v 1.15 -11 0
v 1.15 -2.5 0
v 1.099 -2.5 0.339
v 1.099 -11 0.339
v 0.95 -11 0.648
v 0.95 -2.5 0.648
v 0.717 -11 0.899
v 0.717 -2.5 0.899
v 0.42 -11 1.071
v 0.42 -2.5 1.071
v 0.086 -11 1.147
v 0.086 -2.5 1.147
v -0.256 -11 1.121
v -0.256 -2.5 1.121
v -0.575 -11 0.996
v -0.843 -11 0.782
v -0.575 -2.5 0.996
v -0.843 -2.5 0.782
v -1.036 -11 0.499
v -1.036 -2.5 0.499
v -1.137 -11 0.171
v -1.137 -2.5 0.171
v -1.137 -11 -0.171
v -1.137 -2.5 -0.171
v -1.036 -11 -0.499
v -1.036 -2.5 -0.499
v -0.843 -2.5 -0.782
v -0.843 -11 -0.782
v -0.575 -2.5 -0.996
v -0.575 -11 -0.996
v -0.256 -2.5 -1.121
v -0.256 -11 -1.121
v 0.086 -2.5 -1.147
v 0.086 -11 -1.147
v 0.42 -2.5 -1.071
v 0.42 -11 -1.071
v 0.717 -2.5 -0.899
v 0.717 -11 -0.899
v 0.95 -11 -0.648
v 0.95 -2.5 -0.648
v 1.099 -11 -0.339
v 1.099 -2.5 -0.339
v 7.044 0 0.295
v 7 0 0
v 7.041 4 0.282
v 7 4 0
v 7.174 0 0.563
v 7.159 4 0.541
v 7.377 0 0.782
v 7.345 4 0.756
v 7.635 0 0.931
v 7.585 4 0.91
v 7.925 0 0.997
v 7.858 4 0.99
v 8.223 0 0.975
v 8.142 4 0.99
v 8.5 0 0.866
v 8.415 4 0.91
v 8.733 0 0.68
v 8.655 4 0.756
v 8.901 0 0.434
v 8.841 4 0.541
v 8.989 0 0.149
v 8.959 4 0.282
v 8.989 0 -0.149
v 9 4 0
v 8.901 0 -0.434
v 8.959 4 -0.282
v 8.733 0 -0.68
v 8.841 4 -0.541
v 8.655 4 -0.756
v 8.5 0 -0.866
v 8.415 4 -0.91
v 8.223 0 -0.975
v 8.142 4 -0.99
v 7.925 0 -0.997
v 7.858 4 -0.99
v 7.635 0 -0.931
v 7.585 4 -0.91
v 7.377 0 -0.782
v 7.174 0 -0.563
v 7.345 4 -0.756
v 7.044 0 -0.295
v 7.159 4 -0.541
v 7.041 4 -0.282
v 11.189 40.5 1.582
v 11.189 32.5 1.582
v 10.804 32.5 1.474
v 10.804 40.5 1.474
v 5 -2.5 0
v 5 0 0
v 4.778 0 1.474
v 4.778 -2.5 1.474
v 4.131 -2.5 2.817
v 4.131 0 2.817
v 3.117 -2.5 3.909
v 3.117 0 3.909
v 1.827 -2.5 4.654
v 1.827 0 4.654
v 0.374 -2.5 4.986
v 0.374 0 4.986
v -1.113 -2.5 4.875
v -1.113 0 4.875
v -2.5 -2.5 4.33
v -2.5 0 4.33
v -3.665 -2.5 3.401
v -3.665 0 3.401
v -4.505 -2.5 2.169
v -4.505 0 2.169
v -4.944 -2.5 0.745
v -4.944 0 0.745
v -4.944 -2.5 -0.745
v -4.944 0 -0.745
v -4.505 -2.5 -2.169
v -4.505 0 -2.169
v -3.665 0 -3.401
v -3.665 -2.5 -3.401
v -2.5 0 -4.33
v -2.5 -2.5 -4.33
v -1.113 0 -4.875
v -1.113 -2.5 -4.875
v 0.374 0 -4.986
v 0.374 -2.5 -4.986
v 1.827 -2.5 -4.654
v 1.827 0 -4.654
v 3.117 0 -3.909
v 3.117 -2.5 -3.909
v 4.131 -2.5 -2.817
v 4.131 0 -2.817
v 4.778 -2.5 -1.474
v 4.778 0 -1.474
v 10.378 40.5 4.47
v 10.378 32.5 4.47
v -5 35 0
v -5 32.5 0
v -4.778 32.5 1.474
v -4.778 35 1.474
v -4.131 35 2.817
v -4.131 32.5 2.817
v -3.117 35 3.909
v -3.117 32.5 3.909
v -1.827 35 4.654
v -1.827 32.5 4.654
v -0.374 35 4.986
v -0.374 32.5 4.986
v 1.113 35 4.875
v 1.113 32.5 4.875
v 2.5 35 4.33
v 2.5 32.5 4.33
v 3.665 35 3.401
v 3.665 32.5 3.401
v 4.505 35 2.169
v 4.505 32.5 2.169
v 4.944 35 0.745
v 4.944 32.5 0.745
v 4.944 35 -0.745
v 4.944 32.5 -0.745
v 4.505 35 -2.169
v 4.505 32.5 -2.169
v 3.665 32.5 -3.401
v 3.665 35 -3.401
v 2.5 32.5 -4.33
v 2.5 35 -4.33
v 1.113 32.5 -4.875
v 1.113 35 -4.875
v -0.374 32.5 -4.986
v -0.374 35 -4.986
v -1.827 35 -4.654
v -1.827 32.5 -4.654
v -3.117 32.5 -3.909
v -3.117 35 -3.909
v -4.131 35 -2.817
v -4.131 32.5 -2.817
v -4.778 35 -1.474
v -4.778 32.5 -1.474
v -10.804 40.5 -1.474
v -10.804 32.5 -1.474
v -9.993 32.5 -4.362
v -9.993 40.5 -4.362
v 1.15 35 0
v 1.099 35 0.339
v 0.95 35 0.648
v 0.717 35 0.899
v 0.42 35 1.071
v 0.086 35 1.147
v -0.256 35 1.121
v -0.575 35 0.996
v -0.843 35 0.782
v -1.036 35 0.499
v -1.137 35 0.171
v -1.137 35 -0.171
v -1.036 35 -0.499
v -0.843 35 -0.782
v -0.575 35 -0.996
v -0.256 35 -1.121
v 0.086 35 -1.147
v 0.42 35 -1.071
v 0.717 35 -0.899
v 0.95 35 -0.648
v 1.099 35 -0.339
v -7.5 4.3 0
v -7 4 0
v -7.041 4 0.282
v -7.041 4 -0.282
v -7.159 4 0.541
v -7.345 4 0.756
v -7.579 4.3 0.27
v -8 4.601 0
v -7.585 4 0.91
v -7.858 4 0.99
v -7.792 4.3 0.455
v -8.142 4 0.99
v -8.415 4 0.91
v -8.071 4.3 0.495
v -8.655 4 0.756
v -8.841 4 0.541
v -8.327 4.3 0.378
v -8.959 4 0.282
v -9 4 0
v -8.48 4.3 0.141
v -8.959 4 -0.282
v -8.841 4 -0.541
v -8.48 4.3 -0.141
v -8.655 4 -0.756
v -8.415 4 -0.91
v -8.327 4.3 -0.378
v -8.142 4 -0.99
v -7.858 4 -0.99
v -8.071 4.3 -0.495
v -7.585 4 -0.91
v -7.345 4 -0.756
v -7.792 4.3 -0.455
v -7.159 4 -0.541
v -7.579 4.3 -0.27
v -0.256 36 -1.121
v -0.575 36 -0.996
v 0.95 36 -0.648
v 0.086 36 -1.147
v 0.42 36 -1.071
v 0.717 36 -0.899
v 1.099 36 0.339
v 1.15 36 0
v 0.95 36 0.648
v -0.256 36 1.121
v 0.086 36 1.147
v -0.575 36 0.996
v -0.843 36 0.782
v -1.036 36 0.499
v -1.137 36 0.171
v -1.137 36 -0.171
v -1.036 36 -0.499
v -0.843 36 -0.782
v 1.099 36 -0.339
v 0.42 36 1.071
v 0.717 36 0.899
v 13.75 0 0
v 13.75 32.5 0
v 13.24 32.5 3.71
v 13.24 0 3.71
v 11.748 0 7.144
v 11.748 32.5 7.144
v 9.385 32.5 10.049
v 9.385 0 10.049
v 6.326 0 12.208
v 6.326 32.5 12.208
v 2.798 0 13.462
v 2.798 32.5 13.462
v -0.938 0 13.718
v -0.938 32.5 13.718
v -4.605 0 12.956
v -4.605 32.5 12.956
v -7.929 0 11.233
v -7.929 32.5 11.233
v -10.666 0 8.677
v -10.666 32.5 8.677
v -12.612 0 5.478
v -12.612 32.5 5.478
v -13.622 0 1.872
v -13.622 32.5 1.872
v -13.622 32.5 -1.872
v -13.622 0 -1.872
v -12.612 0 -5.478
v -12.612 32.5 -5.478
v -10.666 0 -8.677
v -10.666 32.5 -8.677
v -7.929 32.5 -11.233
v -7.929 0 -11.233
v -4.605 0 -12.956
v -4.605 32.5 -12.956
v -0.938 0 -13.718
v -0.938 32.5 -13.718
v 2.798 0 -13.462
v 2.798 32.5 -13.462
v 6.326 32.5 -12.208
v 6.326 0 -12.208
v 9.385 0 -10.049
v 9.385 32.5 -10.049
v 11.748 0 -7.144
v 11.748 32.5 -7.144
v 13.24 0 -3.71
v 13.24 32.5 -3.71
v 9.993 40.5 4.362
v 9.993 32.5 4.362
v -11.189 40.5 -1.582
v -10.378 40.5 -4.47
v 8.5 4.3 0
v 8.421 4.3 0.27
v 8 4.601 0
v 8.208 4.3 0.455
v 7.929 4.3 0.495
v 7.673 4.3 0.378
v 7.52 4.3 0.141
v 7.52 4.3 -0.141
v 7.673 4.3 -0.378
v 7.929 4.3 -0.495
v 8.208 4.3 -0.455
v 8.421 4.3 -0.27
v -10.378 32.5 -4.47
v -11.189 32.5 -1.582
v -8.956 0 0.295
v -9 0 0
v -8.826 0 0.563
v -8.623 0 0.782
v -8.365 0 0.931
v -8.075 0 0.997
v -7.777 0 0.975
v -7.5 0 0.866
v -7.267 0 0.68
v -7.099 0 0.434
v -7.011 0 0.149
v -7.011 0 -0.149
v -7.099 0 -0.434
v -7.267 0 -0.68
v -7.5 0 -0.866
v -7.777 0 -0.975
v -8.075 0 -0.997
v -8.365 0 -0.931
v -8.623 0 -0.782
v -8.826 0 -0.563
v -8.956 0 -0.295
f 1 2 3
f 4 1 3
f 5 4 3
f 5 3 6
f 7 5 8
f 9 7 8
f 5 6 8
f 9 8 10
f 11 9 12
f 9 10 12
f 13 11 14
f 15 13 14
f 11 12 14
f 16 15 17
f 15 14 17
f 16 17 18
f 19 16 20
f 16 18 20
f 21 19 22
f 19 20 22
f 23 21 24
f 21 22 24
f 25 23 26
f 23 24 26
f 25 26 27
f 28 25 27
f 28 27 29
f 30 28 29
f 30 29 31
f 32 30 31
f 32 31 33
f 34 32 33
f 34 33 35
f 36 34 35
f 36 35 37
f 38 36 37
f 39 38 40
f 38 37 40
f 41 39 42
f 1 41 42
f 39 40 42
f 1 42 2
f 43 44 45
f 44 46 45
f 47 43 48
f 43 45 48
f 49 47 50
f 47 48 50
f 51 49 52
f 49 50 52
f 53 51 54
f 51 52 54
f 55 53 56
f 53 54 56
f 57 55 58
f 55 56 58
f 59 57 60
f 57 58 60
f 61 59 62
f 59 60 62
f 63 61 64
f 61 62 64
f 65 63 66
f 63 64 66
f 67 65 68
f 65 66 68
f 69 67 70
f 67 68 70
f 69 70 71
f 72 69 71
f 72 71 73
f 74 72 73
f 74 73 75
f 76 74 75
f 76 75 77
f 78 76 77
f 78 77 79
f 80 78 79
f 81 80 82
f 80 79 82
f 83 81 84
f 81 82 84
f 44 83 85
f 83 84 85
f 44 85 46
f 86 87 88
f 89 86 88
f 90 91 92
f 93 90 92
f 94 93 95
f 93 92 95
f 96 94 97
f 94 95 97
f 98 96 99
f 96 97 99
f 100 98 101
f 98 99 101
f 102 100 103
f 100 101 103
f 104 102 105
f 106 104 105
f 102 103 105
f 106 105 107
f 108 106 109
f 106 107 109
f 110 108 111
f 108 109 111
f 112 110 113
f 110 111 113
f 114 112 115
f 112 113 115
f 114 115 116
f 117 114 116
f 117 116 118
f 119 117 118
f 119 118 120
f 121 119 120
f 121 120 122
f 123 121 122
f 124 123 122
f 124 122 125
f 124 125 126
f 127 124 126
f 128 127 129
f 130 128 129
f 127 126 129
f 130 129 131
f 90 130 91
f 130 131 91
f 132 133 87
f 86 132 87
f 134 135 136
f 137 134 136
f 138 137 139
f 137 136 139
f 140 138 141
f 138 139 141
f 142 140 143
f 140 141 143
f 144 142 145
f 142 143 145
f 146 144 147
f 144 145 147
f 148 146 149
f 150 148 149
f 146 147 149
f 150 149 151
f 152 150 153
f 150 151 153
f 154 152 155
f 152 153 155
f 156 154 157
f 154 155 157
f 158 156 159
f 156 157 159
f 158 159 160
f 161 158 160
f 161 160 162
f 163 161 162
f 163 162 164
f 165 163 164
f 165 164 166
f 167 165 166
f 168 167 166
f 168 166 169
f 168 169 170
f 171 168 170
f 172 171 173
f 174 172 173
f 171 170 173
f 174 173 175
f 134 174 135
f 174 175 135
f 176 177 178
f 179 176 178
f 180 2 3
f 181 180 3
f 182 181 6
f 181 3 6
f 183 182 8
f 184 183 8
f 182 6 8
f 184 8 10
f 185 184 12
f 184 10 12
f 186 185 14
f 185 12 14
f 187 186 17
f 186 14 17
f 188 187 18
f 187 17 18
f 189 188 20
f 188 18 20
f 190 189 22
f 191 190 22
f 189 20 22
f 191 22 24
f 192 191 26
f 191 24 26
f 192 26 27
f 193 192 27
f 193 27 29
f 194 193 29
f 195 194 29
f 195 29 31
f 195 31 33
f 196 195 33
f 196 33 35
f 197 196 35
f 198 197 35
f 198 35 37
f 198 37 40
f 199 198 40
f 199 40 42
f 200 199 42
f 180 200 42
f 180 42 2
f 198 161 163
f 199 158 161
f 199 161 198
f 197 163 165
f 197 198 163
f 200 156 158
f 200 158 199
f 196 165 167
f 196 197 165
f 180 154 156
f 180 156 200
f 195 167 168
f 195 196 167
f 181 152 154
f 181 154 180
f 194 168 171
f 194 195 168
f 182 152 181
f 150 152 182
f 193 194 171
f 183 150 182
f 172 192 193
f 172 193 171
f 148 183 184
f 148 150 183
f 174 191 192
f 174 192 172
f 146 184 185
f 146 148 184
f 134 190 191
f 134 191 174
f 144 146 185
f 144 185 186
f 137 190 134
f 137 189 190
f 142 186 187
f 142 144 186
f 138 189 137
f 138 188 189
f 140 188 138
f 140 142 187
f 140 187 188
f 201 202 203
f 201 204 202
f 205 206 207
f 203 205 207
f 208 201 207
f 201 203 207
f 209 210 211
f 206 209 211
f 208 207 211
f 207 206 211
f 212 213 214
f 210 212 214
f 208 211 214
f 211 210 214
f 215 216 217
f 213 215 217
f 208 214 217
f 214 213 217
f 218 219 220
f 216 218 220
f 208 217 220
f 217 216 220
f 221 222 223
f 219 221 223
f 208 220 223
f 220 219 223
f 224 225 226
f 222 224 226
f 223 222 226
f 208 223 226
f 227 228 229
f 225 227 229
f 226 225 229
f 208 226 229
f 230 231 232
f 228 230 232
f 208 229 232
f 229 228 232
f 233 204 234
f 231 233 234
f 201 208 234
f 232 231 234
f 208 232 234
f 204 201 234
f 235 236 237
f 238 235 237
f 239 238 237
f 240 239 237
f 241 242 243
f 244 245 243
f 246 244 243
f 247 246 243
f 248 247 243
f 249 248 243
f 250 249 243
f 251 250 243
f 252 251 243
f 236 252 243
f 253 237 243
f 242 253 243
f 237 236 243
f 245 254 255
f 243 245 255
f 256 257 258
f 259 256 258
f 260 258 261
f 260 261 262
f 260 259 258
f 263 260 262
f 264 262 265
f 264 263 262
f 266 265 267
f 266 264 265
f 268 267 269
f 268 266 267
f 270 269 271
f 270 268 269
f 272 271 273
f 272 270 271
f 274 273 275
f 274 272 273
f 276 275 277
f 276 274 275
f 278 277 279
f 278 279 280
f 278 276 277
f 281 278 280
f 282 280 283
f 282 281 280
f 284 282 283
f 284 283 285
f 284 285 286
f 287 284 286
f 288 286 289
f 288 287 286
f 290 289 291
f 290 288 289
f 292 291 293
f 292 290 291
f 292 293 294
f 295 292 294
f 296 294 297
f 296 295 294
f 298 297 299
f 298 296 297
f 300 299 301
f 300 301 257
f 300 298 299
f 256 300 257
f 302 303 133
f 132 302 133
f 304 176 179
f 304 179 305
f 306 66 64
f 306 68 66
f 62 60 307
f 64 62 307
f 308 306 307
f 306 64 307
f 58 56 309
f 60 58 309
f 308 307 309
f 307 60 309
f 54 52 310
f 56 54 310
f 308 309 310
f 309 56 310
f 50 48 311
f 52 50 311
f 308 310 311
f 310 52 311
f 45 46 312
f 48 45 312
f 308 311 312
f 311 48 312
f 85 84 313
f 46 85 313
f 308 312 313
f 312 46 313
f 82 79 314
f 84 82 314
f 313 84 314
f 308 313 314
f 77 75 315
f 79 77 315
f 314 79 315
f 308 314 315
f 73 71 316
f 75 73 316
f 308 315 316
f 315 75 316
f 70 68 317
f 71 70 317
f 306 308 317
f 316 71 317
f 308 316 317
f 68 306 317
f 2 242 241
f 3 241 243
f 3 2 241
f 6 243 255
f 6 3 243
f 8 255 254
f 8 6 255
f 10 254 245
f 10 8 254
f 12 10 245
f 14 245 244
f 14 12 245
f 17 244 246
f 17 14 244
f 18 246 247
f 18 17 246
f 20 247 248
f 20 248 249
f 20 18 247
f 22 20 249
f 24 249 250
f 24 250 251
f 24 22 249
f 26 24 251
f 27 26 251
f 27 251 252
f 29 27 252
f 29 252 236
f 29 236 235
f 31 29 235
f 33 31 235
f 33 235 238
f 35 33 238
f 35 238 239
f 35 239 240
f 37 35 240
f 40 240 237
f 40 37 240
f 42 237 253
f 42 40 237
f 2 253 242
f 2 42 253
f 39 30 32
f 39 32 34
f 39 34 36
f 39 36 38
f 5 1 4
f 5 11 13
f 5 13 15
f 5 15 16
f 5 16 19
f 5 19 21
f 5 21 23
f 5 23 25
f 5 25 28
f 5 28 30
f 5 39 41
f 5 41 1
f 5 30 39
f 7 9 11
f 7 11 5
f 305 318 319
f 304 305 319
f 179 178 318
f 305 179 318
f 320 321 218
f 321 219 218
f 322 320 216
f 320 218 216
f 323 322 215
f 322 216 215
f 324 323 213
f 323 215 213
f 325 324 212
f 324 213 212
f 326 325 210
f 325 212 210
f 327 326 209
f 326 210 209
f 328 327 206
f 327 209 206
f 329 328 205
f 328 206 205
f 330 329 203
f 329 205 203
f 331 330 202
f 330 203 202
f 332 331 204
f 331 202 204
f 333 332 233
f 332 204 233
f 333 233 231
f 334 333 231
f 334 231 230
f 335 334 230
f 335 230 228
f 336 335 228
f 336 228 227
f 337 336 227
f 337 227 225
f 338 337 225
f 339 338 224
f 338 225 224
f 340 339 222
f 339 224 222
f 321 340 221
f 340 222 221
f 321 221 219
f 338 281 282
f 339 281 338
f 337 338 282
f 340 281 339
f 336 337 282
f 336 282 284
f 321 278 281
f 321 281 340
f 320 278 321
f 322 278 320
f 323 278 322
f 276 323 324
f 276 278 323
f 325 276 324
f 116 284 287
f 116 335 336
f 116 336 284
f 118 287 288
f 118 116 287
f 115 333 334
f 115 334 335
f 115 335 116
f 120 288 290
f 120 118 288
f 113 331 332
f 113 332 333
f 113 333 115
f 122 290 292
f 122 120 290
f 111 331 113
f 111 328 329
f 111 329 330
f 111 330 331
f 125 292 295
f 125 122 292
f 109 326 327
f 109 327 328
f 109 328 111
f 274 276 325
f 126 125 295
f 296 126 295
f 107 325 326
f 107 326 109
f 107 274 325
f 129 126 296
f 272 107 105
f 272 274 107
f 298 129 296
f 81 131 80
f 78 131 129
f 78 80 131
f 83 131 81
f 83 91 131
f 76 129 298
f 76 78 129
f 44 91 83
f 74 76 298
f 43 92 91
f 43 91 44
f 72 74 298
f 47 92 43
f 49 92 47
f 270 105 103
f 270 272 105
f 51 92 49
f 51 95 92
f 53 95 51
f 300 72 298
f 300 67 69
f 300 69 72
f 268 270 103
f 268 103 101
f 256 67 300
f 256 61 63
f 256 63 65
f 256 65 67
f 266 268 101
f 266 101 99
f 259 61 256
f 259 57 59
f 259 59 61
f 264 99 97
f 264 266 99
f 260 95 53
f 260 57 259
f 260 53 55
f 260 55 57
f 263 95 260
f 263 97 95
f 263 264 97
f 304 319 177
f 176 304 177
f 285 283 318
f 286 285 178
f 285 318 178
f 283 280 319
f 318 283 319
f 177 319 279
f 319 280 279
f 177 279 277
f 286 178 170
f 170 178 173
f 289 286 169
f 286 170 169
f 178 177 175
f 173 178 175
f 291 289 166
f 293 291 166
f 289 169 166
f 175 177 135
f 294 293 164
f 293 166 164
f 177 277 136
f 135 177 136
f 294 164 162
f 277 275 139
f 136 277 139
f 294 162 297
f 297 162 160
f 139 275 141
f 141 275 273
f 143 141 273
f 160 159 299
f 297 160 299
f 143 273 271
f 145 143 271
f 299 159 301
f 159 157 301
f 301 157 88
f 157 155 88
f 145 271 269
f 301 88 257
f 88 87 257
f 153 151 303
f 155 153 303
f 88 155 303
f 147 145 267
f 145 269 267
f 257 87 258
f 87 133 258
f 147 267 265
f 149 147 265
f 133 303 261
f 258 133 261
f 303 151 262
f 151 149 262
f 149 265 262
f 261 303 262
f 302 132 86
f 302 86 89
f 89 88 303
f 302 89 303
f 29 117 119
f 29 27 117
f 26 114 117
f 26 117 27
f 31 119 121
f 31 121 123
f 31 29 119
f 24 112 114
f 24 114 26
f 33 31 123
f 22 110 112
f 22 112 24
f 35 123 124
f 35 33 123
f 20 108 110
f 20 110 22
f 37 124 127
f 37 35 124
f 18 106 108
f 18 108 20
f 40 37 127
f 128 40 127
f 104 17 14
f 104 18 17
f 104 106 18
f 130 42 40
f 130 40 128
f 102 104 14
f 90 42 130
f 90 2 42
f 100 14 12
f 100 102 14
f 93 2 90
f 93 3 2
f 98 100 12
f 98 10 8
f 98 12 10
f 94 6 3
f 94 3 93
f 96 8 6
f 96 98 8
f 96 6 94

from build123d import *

# Parameters (mm, degrees)
F0_R      = 13.75
F1_DEPTH  = 32.5
F2_R      = 5
F3_DEPTH  = 2.5
F4_R      = 5
F5_DEPTH  = 2.5
F7_D      = 2
F7_DEPTH  = 4
F7_TIP    = 0.600860619
F9_DEPTH  = 8
F10_R     = 1.15
F11_DEPTH = 43.001
F12_R     = 1.15
F13_DEPTH = 38.5
F14_R     = 1.15
F15_DEPTH = 8.5


with BuildPart() as f1:
    # F0 (on Front) → F1 (new body)
    with BuildSketch(Plane.XZ):
        Circle(F0_R)
    extrude(amount=-F1_DEPTH)

    # F2 (on face) → F3 (join)
    with BuildSketch(Plane.XZ):
        Circle(F2_R)
    extrude(amount=F3_DEPTH)

    # F4 (on face) → F5 (join)
    with BuildSketch(Plane(origin=(0, 32.5, 0), x_dir=(-1, 0, 0), z_dir=(0, 1, 0))):
        Circle(F4_R)
    extrude(amount=F5_DEPTH)

    # F7
    with Locations(Plane.XZ):
        with Locations((-8, 0), (8, 0)):
            Hole(F7_D / 2, depth=F7_DEPTH)
            with Locations((0, 0, -(F7_DEPTH + F7_TIP / 2))):  # 118° drill point
                Cone(0, F7_D / 2, F7_TIP, mode=Mode.SUBTRACT)

    # F8 (on face) → F9 (join)
    with BuildSketch(Plane(origin=(0, 32.5, 0), x_dir=(-1, 0, 0), z_dir=(0, 1, 0))):
        Polygon((11.1887406043, -1.5817976137), (10.9961786208, -1.5277616764), (10.8036166373, -1.4737257391), (9.9930775776, -4.3621554911), (10.3782015445, -4.4702273658), align=None)
        Polygon((-10.8036166373, 1.4737257391), (-9.9930775776, 4.3621554911), (-10.3782015445, 4.4702273658), (-11.1887406043, 1.5817976137), (-10.9961786208, 1.5277616764), align=None)
    extrude(amount=F9_DEPTH)

    # F10 (on face) → F11 (cut, through all)
    with BuildSketch(Plane.XZ.offset(2.5)):
        Circle(F10_R)
    extrude(amount=-F11_DEPTH, mode=Mode.SUBTRACT)


with BuildPart() as f13:
    # F12 (on face) → F13 (new body)
    with BuildSketch(Plane.XZ.offset(2.5)):
        Circle(F12_R)
    extrude(amount=-F13_DEPTH)

    # F14 (on face) → F15 (join)
    with BuildSketch(Plane.XZ.offset(2.5)):
        Circle(F14_R)
    extrude(amount=F15_DEPTH)


solid = Compound([f1.part, f13.part])
